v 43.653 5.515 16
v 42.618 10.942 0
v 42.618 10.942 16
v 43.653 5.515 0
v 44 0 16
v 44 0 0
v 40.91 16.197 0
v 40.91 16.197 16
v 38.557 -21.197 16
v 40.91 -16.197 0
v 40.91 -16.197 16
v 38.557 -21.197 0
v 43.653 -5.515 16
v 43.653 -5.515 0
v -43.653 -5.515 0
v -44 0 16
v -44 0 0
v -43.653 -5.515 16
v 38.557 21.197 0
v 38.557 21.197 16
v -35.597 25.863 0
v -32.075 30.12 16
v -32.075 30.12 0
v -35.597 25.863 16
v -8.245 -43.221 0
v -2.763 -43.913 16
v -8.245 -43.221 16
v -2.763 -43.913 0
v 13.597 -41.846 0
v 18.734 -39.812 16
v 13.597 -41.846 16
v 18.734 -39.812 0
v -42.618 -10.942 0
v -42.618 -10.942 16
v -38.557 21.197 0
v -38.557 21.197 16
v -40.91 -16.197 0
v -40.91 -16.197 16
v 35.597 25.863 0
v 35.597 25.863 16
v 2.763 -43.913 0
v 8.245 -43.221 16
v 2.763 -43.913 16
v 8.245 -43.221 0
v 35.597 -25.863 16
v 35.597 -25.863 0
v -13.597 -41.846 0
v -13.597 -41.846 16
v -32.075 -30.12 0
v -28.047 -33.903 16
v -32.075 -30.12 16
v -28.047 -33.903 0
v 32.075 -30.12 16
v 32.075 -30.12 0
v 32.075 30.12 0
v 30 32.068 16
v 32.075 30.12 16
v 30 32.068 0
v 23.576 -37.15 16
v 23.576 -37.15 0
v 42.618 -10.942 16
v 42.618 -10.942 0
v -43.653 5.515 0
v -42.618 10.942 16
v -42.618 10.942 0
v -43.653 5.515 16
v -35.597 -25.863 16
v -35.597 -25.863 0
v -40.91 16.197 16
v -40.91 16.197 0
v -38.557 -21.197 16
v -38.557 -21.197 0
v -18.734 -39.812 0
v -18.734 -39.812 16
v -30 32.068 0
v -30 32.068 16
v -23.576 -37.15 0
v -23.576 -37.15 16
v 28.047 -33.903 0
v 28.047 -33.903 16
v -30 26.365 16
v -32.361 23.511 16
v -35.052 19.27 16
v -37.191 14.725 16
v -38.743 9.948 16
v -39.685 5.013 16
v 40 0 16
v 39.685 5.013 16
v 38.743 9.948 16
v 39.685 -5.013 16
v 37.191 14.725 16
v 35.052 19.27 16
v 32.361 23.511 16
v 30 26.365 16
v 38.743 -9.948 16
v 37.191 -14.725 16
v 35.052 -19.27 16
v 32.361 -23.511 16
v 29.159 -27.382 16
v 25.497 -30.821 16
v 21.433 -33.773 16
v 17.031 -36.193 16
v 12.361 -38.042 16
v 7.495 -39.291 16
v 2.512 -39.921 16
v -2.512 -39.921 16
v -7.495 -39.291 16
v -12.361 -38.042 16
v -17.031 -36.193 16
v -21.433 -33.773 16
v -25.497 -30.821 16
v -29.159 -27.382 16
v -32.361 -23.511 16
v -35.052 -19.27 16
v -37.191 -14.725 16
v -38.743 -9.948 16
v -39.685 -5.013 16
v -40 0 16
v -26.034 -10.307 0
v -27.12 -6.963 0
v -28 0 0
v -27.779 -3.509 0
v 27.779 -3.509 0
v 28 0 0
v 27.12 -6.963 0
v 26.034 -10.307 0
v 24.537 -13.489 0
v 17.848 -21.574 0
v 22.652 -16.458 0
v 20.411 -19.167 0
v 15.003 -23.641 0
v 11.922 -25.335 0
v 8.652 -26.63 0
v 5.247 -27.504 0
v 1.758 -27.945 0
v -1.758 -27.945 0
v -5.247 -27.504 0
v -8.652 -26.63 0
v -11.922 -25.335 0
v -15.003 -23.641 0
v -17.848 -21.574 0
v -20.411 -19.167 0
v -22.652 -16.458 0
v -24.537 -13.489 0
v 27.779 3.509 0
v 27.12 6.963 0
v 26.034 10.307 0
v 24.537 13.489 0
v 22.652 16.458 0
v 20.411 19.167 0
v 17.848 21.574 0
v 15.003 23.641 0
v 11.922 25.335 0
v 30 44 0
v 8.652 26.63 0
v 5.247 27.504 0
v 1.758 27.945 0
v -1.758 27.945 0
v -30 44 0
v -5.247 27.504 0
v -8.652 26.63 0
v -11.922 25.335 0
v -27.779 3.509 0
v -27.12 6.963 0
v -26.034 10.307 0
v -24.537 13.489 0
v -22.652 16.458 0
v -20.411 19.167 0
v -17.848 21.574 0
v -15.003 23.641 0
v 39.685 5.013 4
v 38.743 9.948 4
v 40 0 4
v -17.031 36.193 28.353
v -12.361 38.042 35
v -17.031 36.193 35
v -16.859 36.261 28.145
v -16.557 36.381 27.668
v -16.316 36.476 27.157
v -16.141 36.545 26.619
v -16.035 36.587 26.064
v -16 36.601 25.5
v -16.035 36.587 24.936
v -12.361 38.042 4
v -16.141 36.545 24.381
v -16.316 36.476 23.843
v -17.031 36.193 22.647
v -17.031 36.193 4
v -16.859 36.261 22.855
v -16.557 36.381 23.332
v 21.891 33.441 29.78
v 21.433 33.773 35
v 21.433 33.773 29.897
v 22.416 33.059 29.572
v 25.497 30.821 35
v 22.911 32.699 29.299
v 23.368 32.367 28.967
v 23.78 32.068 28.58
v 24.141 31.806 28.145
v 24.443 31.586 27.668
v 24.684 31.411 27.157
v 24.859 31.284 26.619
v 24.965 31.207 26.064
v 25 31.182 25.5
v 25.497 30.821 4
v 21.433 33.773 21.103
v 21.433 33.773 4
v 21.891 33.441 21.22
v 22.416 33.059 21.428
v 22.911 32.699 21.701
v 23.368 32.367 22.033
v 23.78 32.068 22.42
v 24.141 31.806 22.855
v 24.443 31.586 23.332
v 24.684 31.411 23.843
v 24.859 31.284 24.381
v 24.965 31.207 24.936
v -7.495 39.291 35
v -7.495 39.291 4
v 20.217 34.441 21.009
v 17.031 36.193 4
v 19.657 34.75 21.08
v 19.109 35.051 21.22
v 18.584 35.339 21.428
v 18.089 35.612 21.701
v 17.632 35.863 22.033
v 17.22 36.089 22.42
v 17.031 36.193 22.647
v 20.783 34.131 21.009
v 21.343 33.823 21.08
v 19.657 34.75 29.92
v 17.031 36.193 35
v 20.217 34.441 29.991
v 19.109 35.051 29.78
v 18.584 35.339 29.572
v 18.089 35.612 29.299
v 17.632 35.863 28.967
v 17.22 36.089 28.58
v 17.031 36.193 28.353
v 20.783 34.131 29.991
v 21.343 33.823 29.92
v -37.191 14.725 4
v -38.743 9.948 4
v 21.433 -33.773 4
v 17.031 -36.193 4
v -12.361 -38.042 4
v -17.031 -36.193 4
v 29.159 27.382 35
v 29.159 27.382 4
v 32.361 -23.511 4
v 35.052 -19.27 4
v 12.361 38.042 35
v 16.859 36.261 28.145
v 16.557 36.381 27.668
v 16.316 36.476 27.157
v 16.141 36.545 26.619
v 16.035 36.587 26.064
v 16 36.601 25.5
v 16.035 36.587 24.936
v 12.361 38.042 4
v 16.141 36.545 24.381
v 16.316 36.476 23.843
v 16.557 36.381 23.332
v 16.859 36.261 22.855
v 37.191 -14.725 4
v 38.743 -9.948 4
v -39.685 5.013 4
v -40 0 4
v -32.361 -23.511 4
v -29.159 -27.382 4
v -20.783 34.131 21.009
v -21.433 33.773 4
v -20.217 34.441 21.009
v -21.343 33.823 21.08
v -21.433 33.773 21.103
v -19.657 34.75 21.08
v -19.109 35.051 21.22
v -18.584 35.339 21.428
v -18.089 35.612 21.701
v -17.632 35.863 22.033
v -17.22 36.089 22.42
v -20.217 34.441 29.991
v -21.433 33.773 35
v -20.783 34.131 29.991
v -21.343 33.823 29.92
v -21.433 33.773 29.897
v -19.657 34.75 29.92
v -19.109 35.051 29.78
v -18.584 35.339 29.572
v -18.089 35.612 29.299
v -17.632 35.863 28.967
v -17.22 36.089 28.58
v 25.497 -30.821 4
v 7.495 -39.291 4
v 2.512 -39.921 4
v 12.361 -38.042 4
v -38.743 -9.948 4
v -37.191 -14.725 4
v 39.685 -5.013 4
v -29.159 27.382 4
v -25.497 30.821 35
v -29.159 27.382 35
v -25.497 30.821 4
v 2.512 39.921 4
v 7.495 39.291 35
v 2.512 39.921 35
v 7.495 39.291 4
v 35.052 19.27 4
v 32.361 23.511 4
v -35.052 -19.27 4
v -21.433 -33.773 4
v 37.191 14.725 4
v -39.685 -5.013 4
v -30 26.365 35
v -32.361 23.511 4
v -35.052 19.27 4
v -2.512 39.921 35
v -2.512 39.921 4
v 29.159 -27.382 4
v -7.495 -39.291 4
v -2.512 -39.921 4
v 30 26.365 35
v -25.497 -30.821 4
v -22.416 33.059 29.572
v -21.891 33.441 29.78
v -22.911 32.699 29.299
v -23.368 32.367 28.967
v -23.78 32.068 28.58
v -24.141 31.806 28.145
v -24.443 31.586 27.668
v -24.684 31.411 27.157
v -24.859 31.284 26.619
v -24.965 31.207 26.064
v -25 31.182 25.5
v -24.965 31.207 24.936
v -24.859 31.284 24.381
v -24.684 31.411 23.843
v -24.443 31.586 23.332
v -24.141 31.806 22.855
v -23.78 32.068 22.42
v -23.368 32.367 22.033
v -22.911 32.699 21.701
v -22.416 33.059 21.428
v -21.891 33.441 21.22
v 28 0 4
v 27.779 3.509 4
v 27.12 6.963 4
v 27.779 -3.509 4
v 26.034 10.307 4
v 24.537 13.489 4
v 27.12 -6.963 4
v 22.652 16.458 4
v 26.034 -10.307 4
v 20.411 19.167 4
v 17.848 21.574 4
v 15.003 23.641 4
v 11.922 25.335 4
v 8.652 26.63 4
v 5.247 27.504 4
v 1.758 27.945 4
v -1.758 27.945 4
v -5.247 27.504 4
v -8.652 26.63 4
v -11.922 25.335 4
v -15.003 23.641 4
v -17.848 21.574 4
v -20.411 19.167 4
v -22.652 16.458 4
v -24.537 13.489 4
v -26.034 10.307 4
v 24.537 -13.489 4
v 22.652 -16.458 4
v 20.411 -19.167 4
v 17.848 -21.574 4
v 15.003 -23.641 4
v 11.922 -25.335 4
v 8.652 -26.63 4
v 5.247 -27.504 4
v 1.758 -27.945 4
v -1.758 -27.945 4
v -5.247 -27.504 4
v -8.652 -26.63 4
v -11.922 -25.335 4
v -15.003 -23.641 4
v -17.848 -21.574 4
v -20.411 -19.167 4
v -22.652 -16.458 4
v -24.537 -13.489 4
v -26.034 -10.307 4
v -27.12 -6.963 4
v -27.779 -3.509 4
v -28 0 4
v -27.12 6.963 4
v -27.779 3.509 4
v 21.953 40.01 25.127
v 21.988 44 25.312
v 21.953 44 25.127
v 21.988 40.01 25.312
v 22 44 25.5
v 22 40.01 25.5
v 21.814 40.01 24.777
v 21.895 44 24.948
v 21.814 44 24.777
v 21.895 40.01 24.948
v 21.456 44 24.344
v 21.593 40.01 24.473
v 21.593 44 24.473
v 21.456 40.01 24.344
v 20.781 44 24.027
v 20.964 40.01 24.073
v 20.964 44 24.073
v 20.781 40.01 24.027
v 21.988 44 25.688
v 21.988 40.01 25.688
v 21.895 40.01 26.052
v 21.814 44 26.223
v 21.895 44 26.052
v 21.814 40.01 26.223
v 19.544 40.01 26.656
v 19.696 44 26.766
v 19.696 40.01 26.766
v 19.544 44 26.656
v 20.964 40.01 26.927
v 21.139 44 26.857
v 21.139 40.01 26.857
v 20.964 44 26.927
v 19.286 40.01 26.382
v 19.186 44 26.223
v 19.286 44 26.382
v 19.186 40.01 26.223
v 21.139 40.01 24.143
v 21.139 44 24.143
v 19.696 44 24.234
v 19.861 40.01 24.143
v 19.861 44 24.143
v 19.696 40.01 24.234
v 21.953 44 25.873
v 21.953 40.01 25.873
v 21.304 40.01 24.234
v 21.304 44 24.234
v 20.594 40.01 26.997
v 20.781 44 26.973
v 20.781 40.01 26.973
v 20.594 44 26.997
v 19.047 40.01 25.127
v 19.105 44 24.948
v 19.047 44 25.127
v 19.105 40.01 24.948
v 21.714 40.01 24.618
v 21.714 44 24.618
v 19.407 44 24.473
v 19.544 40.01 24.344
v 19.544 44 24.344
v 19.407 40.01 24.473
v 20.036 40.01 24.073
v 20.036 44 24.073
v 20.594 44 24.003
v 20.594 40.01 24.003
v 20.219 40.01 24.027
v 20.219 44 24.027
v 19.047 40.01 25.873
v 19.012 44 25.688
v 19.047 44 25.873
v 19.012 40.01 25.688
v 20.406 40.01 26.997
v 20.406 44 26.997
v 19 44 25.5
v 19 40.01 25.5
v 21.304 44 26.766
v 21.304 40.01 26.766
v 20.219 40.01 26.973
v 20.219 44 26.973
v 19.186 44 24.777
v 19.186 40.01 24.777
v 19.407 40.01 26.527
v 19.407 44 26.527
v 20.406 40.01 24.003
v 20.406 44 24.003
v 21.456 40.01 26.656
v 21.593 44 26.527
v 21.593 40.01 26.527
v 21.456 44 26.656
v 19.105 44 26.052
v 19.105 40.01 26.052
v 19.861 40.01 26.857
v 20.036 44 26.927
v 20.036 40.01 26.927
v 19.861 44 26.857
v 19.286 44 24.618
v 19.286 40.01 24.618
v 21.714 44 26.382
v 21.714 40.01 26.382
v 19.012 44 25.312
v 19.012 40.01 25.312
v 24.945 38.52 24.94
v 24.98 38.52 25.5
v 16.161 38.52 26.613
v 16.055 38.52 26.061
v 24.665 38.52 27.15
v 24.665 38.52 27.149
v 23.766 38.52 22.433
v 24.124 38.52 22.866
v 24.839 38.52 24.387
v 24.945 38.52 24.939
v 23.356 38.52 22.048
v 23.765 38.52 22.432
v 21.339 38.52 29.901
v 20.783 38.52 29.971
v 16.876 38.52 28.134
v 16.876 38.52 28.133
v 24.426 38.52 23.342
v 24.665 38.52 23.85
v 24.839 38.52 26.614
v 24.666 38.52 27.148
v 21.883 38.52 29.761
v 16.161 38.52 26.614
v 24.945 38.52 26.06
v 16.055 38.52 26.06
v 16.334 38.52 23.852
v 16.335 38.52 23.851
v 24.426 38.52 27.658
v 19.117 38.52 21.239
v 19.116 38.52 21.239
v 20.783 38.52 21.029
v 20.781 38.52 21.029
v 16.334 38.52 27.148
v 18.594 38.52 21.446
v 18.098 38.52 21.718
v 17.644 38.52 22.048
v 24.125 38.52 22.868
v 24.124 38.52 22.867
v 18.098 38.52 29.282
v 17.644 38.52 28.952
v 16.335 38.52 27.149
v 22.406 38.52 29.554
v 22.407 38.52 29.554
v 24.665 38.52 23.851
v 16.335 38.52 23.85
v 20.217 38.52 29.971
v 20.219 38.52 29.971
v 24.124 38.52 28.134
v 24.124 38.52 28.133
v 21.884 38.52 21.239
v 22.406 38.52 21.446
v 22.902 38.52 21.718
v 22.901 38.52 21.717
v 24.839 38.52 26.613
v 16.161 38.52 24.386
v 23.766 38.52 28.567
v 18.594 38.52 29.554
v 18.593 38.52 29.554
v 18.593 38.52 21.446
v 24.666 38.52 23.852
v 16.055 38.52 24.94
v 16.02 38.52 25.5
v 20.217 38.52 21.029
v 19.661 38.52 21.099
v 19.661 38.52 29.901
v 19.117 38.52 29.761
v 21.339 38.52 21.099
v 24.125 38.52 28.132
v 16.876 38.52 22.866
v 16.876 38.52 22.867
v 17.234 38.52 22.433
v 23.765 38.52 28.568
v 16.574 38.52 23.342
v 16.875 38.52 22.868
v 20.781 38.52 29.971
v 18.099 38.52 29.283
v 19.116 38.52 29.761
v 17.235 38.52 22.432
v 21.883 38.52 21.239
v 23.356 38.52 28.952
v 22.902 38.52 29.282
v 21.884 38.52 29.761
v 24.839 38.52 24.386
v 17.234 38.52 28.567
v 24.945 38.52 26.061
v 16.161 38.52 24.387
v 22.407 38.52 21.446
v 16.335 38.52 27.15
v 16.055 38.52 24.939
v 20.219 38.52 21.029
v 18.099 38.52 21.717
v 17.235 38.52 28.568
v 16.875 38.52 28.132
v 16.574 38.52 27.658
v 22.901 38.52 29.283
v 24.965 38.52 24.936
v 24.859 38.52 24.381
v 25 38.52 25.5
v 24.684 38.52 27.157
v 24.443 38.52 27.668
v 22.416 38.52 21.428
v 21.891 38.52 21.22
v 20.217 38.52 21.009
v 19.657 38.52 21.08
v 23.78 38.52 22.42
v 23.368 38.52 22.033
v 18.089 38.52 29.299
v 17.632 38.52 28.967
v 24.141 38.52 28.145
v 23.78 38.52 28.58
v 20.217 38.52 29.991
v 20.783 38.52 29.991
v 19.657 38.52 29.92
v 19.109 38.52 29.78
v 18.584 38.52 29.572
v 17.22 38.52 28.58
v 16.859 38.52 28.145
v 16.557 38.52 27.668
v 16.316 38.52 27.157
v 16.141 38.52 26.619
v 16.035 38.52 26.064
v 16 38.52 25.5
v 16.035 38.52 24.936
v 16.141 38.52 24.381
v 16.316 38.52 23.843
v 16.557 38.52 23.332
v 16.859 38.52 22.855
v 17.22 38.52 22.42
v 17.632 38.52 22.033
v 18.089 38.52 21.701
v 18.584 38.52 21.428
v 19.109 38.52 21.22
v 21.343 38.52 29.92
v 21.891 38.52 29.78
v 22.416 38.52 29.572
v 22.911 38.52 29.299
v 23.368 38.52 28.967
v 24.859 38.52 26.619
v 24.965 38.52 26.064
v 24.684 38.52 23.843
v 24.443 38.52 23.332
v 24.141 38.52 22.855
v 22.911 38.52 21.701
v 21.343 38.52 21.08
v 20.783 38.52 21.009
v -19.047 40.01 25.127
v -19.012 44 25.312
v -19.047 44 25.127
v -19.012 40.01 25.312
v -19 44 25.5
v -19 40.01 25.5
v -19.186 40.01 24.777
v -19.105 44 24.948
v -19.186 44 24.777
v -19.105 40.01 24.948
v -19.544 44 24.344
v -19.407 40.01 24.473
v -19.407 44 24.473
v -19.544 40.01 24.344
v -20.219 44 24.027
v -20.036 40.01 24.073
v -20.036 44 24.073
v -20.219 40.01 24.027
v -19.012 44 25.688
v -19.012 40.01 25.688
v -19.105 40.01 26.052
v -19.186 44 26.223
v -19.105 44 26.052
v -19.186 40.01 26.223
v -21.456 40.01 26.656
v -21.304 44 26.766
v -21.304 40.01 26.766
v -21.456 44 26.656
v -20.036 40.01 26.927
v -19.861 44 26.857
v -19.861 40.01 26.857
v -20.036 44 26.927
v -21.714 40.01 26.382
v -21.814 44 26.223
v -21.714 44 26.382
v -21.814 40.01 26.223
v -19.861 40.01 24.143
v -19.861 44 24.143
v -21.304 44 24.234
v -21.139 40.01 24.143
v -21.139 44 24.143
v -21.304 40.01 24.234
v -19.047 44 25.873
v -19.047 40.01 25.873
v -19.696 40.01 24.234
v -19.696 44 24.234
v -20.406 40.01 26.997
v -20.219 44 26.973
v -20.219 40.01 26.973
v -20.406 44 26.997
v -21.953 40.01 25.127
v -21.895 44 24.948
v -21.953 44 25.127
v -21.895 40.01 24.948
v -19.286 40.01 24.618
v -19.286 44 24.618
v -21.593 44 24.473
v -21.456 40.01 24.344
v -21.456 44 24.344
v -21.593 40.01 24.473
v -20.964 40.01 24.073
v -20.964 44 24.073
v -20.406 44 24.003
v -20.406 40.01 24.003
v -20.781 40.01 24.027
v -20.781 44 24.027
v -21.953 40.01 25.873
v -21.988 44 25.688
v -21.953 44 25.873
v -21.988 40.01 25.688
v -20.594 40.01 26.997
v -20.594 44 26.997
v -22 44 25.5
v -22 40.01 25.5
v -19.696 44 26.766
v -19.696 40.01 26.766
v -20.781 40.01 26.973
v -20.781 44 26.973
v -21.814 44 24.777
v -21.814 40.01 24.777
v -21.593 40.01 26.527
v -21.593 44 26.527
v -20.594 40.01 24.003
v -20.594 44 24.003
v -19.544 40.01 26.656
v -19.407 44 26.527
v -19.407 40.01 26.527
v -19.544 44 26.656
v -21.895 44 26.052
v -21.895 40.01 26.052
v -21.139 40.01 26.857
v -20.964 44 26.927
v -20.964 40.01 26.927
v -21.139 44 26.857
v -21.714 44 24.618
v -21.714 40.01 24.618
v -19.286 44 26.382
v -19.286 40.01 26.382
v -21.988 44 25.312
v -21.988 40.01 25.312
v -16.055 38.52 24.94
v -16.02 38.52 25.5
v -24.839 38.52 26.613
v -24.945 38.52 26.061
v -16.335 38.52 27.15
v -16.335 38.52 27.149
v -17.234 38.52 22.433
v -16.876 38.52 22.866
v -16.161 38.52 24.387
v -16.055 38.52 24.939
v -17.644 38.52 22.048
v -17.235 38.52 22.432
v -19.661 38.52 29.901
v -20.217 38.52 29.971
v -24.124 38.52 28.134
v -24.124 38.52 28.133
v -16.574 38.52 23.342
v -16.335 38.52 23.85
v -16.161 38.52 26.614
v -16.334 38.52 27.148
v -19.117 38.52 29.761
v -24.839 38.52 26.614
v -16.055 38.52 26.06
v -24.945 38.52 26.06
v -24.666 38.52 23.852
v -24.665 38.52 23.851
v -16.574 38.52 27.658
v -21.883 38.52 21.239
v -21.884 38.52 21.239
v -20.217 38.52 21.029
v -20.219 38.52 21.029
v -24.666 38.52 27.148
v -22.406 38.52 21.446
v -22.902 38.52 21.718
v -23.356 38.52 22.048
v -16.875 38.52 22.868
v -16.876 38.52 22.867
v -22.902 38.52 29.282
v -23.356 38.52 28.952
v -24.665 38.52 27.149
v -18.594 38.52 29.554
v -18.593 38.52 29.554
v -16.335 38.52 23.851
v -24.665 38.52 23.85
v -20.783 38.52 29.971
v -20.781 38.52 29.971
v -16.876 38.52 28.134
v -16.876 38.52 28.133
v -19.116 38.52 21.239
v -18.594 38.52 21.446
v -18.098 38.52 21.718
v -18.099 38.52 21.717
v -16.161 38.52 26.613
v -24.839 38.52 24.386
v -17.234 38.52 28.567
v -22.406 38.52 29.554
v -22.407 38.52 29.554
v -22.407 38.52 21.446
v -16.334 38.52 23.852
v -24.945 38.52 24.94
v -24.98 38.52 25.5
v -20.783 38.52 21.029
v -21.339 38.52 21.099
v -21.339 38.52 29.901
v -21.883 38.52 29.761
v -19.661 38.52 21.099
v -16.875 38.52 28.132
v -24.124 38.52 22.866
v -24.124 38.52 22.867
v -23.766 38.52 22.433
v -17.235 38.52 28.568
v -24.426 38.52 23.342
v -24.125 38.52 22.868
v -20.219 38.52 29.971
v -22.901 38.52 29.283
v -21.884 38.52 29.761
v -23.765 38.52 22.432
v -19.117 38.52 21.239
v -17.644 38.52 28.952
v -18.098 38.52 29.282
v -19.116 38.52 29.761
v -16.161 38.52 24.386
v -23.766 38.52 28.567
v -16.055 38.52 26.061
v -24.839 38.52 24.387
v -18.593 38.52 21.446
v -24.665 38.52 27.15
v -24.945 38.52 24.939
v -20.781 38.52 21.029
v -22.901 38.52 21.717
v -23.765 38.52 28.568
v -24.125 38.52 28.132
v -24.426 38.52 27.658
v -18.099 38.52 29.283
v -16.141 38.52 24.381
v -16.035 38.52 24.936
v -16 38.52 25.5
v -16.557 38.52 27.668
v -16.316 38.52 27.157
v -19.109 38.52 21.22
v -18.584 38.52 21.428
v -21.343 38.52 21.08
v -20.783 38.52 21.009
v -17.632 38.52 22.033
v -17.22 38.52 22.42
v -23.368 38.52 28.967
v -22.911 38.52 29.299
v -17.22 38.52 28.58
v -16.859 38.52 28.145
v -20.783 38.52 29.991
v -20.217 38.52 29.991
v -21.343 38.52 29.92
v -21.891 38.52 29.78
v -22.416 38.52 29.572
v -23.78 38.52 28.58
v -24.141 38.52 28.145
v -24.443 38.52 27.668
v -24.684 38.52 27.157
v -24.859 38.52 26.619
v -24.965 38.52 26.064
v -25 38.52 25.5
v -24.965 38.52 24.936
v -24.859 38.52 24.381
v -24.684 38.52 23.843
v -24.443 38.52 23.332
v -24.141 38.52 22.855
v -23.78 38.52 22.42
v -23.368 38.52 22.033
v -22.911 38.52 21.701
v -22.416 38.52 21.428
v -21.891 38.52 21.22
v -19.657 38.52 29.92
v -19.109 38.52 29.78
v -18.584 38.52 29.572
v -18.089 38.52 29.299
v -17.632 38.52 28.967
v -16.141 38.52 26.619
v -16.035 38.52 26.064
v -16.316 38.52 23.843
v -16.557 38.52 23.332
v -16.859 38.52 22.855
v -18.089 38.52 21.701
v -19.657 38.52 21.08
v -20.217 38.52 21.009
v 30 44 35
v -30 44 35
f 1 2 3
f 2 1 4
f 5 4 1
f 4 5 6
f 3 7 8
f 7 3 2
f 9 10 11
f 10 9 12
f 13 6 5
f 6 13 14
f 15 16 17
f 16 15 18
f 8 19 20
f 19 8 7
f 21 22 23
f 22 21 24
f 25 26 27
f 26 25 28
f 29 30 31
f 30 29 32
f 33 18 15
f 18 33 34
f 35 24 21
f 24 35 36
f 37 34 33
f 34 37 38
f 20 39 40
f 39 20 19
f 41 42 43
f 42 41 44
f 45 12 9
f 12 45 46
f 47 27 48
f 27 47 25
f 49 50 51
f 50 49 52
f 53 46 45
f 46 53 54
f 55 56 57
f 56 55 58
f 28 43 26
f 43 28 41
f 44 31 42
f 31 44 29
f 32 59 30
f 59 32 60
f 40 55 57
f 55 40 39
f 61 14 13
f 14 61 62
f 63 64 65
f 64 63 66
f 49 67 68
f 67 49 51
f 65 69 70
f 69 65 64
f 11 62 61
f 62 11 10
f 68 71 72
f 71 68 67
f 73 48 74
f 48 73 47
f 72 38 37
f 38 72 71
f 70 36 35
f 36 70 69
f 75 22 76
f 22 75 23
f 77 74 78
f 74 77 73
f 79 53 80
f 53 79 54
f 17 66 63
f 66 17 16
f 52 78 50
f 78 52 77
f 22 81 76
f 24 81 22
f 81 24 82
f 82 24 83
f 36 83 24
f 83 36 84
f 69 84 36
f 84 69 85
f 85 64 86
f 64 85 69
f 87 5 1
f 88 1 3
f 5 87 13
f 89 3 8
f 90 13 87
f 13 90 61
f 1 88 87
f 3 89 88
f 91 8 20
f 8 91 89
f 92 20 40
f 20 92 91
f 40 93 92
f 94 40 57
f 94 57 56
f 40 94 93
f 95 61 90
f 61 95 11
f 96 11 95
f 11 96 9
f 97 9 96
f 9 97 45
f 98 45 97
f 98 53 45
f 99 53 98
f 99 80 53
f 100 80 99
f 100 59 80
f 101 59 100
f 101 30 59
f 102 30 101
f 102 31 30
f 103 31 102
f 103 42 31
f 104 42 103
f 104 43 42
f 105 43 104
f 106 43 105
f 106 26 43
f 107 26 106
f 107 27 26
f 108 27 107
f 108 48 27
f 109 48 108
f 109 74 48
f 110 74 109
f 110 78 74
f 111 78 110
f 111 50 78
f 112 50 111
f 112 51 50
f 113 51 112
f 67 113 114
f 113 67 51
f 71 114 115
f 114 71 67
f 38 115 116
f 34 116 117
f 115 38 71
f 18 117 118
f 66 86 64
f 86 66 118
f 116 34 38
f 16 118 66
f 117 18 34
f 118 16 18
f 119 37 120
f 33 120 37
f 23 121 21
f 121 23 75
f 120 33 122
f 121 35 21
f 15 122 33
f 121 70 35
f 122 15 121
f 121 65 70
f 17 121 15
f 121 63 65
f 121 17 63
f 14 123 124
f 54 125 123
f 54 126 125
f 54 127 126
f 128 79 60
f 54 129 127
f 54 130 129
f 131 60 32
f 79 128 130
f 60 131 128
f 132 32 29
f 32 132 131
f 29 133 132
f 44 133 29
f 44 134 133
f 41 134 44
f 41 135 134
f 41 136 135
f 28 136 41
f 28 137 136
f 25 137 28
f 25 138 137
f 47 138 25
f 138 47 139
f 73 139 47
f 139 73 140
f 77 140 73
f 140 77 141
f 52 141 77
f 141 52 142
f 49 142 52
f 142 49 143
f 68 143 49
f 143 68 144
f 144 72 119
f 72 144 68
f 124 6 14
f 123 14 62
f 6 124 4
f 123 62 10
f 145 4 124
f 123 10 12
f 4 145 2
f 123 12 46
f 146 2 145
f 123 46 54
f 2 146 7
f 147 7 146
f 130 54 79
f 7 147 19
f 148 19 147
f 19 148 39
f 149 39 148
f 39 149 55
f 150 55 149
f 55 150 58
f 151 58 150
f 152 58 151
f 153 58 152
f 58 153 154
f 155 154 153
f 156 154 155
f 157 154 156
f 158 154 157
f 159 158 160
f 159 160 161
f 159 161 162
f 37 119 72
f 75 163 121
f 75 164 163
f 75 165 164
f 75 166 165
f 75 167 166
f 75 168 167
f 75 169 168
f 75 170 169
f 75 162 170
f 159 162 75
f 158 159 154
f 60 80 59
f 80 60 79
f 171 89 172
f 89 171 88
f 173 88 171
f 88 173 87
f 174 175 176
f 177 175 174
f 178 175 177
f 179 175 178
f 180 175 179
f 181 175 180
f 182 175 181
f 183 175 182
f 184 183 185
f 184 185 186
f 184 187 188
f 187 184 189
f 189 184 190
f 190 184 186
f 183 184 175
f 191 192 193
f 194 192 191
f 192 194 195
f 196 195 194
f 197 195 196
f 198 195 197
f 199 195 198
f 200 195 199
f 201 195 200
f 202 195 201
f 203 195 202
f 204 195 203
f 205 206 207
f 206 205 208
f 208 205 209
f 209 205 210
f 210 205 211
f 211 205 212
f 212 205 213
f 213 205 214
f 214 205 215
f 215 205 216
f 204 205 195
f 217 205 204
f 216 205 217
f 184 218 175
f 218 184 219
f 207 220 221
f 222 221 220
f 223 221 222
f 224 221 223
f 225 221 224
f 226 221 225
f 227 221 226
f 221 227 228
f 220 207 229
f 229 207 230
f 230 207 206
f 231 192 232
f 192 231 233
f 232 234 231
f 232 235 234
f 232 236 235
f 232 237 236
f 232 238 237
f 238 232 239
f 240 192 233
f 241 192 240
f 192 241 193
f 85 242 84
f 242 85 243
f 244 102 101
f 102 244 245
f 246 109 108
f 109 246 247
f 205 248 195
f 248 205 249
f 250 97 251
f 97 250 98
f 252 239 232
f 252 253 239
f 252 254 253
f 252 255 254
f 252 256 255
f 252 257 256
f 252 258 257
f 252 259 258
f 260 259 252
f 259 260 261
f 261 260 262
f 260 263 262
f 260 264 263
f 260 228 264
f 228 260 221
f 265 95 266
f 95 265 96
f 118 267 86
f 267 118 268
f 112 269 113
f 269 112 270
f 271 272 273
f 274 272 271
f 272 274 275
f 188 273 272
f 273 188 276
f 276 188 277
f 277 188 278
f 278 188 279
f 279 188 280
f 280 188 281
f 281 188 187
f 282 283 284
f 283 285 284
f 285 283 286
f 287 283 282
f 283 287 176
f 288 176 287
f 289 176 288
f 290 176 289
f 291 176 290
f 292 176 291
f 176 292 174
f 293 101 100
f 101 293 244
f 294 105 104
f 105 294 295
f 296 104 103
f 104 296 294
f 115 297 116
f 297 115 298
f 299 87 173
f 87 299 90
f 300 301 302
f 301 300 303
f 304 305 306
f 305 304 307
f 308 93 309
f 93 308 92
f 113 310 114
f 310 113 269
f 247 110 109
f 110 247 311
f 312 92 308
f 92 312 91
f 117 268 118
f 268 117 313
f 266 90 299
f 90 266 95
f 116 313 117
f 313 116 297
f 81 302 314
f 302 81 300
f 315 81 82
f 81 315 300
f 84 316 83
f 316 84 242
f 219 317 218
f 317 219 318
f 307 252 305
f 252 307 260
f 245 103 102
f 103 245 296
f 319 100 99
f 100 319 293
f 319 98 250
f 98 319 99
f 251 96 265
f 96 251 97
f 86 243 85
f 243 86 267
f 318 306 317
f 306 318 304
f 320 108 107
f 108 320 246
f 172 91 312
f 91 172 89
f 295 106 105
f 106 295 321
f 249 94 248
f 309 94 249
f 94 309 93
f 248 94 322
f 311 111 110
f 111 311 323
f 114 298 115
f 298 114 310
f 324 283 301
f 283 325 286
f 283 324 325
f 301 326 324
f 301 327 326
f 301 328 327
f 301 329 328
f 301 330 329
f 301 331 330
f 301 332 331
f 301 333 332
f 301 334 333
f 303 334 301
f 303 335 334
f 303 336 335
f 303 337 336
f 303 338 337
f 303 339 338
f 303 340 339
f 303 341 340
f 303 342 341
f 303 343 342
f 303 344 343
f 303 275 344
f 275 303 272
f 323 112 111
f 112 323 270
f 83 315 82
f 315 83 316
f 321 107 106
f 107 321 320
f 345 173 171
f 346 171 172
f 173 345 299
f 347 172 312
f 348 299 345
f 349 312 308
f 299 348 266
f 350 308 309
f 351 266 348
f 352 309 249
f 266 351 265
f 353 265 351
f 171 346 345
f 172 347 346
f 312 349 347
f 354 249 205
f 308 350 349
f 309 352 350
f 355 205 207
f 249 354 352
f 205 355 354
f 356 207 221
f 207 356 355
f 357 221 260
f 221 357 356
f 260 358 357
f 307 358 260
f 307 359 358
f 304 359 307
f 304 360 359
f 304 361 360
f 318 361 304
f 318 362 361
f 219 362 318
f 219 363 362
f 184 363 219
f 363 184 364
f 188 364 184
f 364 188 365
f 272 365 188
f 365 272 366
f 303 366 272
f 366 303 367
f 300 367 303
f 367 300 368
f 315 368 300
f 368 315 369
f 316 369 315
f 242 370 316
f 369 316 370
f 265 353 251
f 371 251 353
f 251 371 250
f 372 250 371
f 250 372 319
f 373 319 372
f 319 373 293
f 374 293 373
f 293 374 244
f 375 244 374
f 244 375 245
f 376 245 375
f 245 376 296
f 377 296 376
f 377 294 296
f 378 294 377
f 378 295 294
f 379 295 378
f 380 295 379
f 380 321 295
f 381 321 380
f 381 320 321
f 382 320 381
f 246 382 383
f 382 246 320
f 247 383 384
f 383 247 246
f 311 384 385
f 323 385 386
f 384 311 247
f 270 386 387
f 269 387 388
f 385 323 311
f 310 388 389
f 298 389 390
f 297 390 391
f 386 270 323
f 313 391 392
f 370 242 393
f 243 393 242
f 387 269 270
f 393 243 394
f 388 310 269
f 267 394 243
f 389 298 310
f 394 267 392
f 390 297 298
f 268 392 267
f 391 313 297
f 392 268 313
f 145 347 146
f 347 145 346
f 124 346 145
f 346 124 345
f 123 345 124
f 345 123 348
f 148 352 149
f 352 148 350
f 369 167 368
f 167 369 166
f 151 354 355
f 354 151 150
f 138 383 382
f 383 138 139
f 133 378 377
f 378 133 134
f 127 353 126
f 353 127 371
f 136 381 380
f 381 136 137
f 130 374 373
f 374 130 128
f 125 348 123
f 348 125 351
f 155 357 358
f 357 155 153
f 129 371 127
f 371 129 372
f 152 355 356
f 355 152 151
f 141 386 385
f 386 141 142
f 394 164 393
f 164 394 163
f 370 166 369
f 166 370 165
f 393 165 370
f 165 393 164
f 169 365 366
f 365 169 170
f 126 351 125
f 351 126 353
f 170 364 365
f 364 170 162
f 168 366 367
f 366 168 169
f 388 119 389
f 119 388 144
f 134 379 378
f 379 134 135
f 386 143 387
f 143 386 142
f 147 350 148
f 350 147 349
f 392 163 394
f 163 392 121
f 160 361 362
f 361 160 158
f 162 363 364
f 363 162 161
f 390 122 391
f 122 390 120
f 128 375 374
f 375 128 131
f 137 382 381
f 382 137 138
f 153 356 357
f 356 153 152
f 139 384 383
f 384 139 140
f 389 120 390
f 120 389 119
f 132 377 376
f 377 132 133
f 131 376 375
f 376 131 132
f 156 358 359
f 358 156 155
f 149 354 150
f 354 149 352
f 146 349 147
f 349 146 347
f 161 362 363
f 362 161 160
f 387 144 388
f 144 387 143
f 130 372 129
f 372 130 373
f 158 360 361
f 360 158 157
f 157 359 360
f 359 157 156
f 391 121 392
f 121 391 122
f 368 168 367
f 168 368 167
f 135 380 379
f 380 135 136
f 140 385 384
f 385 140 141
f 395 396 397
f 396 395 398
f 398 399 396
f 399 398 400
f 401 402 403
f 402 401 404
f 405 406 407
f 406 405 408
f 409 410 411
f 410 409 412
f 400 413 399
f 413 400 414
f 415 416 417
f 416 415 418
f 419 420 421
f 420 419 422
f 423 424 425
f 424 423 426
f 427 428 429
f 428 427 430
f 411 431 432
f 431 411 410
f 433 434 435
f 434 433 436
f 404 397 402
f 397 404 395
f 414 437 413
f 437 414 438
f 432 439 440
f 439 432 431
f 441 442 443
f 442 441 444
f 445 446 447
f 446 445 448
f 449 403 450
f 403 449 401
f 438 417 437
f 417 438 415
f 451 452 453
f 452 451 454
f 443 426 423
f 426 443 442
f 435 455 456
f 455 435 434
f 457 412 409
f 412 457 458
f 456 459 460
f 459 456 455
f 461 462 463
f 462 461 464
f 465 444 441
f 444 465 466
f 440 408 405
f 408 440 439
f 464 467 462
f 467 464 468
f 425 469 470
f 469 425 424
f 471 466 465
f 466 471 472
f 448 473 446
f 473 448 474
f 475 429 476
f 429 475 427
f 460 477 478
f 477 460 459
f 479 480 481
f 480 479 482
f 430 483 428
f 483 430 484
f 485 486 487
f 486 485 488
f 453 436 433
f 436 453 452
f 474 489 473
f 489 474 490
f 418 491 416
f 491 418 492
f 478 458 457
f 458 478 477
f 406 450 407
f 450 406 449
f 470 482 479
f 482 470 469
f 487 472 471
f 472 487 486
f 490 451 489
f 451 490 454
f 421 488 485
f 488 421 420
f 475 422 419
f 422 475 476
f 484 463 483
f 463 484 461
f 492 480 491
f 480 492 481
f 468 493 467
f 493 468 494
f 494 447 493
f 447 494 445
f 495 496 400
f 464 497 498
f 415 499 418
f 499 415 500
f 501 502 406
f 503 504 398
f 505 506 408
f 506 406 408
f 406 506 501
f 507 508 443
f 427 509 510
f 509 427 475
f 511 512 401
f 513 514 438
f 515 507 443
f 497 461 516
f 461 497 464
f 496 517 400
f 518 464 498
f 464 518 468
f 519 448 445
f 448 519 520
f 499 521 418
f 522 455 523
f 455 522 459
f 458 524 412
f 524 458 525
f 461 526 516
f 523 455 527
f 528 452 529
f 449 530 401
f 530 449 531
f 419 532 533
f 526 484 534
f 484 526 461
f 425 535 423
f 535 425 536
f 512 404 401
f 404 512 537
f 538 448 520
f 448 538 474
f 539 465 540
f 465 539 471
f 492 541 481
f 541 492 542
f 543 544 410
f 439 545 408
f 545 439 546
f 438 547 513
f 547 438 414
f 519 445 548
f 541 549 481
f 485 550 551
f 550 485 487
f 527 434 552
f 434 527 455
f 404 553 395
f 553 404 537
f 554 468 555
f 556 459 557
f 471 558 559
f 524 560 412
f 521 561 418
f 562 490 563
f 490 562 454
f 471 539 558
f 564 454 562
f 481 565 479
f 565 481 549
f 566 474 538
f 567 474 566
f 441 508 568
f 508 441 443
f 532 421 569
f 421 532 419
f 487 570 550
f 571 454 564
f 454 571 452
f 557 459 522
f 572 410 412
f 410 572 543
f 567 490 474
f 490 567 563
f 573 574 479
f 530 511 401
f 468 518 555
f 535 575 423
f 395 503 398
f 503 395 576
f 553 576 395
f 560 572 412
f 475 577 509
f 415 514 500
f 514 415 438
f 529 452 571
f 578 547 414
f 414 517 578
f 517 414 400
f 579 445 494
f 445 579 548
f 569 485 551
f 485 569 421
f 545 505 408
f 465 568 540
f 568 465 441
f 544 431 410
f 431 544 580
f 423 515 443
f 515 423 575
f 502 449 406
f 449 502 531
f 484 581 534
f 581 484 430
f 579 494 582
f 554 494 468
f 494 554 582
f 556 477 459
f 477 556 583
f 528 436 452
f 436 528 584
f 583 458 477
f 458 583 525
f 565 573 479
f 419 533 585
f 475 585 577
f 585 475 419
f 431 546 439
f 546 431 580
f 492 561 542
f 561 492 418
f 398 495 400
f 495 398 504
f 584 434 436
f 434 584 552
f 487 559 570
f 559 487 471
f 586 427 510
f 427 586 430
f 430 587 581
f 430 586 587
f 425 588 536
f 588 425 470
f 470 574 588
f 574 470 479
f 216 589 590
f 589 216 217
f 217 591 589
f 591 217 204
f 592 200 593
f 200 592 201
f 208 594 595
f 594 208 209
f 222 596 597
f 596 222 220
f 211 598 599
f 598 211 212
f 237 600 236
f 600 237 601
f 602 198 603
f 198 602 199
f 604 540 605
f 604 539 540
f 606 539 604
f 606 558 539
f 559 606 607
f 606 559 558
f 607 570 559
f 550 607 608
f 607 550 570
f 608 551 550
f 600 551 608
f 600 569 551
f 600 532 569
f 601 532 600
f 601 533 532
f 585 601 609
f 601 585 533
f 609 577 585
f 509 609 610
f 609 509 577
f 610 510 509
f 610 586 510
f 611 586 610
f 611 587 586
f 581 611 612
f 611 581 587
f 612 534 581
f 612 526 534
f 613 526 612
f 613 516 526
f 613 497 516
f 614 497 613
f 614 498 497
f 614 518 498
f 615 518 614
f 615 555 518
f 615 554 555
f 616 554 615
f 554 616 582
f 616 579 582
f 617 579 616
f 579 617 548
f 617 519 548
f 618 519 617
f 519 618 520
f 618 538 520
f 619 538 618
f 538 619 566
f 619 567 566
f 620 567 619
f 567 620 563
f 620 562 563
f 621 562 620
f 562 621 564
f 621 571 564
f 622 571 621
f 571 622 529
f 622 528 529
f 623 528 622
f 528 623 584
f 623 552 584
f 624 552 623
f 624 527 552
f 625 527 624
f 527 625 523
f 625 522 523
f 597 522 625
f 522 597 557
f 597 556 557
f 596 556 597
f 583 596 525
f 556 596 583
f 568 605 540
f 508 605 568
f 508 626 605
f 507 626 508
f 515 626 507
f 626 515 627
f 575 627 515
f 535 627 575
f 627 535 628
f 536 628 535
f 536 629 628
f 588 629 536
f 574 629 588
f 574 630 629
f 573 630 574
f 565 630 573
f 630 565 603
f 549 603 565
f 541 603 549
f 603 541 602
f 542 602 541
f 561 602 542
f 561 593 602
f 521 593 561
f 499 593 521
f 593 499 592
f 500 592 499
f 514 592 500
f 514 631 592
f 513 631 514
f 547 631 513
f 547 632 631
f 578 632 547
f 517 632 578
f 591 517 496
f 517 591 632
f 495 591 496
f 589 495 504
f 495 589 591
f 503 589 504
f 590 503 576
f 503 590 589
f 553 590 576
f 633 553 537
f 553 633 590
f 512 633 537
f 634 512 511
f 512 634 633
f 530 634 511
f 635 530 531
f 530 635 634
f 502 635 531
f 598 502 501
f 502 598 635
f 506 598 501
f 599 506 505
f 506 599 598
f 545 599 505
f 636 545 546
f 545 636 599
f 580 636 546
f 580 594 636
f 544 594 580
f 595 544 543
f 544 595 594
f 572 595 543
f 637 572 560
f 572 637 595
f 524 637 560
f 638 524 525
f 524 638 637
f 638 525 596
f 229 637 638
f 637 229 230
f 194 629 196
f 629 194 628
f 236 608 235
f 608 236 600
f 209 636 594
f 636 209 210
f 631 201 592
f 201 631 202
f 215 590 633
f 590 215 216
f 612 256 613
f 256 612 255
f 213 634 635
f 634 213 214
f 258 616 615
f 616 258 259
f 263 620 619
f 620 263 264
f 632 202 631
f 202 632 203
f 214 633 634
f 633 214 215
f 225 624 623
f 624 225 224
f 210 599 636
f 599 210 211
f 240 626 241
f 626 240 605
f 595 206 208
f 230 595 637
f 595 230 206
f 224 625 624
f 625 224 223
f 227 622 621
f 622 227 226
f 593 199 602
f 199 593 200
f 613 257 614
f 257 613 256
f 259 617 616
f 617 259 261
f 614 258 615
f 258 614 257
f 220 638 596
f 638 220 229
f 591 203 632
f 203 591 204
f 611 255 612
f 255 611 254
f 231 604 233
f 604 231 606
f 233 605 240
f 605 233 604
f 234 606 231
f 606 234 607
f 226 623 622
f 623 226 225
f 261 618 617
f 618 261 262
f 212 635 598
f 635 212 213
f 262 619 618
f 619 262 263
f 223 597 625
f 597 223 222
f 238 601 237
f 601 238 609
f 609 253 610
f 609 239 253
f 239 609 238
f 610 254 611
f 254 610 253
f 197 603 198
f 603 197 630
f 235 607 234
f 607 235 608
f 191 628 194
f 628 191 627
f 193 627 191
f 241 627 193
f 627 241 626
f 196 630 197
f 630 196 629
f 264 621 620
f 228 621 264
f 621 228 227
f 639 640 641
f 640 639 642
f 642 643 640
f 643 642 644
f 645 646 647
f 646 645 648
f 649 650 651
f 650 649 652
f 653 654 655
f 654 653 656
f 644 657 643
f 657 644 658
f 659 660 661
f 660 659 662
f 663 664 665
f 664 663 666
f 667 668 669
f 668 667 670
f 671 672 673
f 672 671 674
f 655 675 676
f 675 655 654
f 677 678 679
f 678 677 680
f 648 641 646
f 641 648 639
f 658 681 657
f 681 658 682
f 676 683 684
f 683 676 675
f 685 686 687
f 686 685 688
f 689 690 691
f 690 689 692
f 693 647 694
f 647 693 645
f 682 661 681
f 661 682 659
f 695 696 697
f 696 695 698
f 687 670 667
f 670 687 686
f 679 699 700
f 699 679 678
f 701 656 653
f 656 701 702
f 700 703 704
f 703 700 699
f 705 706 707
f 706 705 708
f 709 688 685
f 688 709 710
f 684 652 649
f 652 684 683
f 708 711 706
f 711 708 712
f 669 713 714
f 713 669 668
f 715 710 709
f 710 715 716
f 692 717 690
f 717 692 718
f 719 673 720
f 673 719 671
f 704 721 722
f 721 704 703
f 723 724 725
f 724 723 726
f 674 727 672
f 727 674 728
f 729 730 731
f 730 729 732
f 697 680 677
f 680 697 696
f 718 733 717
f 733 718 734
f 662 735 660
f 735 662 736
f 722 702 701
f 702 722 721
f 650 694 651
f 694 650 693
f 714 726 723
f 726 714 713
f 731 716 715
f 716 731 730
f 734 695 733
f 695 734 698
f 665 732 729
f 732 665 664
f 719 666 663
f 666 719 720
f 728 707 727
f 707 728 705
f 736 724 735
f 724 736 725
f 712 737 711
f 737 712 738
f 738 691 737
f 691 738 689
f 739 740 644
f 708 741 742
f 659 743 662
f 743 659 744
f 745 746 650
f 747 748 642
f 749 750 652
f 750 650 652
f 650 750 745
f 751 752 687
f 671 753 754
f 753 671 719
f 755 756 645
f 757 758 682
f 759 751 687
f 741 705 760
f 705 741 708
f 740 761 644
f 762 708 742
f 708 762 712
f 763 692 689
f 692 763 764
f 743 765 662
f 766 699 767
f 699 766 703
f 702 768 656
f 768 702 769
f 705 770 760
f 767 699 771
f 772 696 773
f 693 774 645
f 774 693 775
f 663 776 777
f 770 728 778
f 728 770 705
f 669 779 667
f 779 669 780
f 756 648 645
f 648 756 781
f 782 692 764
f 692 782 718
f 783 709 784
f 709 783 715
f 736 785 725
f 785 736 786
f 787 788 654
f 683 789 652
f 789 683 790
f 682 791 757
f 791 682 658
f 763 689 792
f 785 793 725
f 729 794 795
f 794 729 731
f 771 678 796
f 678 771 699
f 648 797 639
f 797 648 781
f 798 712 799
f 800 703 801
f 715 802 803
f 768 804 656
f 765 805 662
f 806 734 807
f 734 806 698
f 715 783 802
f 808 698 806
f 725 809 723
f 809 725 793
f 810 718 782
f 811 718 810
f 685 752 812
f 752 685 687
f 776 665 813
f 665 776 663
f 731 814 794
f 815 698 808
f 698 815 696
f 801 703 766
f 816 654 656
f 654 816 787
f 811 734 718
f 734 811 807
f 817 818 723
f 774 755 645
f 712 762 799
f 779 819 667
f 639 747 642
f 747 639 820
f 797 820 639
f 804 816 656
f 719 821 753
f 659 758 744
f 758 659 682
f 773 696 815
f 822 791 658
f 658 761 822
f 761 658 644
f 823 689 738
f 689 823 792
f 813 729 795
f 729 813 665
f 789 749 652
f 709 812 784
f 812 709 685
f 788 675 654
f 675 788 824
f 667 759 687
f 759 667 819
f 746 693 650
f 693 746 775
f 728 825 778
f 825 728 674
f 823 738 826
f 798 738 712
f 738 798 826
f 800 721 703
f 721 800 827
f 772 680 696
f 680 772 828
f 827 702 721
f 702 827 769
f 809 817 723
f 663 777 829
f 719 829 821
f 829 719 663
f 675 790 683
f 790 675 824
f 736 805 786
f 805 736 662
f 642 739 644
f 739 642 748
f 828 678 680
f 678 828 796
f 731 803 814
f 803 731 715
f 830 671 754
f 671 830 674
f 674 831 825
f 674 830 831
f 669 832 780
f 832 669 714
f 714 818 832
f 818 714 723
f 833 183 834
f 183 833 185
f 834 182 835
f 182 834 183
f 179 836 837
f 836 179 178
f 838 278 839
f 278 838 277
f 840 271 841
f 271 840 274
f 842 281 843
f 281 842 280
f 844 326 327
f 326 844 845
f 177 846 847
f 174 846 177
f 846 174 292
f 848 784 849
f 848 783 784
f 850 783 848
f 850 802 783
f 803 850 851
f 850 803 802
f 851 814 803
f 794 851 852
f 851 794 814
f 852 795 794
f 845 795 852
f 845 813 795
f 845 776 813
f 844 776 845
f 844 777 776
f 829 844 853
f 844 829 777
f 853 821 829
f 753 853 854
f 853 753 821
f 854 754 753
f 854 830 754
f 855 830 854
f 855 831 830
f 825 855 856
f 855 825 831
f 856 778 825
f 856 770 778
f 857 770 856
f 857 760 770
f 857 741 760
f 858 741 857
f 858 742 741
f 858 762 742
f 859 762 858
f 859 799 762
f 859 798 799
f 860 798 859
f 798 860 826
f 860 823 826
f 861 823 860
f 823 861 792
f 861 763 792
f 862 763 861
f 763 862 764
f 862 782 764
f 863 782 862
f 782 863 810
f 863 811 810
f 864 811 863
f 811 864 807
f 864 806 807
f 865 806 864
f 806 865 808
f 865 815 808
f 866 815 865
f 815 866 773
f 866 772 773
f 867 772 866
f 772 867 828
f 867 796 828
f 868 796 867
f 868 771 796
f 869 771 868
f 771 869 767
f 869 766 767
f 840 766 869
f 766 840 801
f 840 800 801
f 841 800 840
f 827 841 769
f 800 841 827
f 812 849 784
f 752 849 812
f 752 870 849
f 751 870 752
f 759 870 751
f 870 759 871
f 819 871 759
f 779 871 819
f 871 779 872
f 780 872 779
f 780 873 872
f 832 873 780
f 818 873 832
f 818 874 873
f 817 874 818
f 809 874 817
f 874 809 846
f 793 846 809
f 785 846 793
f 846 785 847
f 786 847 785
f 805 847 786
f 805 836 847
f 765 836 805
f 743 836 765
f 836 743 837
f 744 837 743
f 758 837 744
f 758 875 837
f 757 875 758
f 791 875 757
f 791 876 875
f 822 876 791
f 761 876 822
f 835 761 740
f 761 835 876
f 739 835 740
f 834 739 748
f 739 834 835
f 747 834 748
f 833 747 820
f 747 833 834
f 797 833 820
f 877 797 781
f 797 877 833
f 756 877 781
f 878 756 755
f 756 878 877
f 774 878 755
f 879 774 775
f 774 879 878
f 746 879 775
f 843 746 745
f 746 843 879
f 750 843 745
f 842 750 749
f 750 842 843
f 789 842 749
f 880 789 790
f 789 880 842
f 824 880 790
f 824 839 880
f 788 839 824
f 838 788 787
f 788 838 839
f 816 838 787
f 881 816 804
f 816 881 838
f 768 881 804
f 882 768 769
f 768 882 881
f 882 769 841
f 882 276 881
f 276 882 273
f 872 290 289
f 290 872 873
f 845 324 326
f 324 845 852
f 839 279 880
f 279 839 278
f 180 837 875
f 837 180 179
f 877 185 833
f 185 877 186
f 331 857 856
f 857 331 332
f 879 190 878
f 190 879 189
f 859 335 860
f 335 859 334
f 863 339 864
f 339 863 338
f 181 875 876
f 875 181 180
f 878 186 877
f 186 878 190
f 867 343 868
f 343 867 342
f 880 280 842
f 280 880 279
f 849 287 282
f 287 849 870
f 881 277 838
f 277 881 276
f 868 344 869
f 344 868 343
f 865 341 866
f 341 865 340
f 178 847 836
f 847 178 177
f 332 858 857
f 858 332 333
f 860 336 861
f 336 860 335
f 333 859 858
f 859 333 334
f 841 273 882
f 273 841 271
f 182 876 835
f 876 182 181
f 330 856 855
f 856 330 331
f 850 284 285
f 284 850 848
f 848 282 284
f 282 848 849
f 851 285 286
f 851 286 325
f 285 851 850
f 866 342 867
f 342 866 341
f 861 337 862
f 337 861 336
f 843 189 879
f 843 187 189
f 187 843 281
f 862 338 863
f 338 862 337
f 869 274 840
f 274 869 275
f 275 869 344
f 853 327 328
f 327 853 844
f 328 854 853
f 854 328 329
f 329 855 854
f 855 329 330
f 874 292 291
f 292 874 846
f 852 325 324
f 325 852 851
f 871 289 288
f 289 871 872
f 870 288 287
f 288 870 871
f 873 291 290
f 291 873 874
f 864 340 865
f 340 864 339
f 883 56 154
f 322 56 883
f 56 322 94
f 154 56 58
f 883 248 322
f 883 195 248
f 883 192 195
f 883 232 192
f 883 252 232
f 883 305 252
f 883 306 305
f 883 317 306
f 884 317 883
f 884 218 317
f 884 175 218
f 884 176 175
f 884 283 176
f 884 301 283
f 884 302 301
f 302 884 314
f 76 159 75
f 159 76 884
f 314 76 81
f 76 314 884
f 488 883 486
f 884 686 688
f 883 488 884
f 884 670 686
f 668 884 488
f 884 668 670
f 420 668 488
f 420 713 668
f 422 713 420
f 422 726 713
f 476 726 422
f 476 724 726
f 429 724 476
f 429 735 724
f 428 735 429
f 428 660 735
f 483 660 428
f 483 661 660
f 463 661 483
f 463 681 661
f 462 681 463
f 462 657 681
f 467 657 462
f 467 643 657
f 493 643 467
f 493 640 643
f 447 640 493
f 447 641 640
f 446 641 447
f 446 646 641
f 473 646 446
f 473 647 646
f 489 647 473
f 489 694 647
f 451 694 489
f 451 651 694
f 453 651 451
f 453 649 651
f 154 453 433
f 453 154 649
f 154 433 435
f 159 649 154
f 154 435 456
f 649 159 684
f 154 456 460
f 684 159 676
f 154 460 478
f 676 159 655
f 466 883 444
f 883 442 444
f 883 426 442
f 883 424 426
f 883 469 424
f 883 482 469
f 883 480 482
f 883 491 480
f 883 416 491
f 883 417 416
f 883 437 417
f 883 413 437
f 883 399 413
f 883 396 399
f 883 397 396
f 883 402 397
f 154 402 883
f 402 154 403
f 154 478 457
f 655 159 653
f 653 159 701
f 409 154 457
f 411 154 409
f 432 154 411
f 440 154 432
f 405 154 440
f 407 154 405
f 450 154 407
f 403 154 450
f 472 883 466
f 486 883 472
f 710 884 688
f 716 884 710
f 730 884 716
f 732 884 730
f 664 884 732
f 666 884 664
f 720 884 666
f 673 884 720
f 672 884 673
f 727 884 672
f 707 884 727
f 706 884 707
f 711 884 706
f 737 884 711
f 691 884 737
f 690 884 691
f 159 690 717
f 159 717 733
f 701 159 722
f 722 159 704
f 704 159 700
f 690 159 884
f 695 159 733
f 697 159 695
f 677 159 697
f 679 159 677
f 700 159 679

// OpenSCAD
/* [ Basics ] */
// Which one would you like to see?
part = "Base"; // [Base:The bottom of the bracket,Arms:The arms to hold the extinguisher]

//The Diameter of your extinguisher (mm)
extinguisher_diameter = 80;
/* [ Extras ] */
// The width of the walls of the bracket (mm). Most parts scale with this value.
bracket_width = 4;
// The diameter of the screw hole (mm). The countersinking scales with this.
screw_hole_diameter = 3;
// The size of the gap in the arms (degrees).
arm_angle = 120; // [90:180]

/* [Hidden] */
// All done. Customizer doesn't need to see all this


$fn=50;
ext_r = extinguisher_diameter/2;
screw_r = screw_hole_diameter/2;
back_width = ext_r*1.5;
arm_angle = 120;

angle = (arm_angle - 90 )/2;
back_height = 8*bracket_width+screw_hole_diameter;

cube_size = 10; // [1:100]
cylinder_size = 10; // [1:100]

print_part();

module print_part() {
	if (part == "Base") {
		base();
		back_plate();
	} 
	else {
		back_plate();
		arms();
	}
}

module base(){
difference(){
cylinder(r = ext_r+bracket_width, h = 4*bracket_width);
translate([-0,0,bracket_width])cylinder(r = ext_r, h = 4*bracket_width);
translate([0,0,-bracket_width/2])cylinder(r = ext_r-3*bracket_width, h = 2*bracket_width);
}
}
//translate([0,ext_r-bracket_width,4*bracket_width])cube(back_height-4*bracket_width);

module arms(){
difference(){
cylinder(r = ext_r+bracket_width, h = 4*bracket_width);
translate([0,0,-bracket_width])cylinder(r = ext_r, h = 8*bracket_width);
rotate([0,0,angle])rotate([0,0,45+180])translate([0,0,-.01])cube(back_width);
rotate([0,0,-angle])rotate([0,0,45+180])translate([0,0,-.01])cube(back_width);
}
rotate([0,0,arm_angle/2])
translate([0,-(ext_r+bracket_width),0])cylinder(r = bracket_width, h = 4*bracket_width);
rotate([0,0,-arm_angle/2])
translate([0,-(ext_r+bracket_width),0])cylinder(r = bracket_width, h = 4*bracket_width);

}

module back_plate(){
difference(){
translate([-back_width/2,bracket_width,0])cube([back_width, ext_r,back_height]);
translate([0,0,-.01])cylinder(r = ext_r, h = back_width*2);
translate([back_width/2-2*bracket_width-screw_r,0,0])screw_hole();
translate([-(back_width/2-2*bracket_width-screw_r),0,0])screw_hole();
}
}


module screw_hole(){
translate([0,ext_r,6*bracket_width+screw_r])rotate([-90,0,0])
union(){
cylinder(r = screw_r, h = extinguisher_diameter);
translate([0,0,-screw_r+.01])cylinder(r2 = screw_r, r1 = screw_r*3, h = screw_r);
translate([0,0,-screw_r-ext_r+.02])cylinder(r = screw_r*3, h = ext_r);
}
}
